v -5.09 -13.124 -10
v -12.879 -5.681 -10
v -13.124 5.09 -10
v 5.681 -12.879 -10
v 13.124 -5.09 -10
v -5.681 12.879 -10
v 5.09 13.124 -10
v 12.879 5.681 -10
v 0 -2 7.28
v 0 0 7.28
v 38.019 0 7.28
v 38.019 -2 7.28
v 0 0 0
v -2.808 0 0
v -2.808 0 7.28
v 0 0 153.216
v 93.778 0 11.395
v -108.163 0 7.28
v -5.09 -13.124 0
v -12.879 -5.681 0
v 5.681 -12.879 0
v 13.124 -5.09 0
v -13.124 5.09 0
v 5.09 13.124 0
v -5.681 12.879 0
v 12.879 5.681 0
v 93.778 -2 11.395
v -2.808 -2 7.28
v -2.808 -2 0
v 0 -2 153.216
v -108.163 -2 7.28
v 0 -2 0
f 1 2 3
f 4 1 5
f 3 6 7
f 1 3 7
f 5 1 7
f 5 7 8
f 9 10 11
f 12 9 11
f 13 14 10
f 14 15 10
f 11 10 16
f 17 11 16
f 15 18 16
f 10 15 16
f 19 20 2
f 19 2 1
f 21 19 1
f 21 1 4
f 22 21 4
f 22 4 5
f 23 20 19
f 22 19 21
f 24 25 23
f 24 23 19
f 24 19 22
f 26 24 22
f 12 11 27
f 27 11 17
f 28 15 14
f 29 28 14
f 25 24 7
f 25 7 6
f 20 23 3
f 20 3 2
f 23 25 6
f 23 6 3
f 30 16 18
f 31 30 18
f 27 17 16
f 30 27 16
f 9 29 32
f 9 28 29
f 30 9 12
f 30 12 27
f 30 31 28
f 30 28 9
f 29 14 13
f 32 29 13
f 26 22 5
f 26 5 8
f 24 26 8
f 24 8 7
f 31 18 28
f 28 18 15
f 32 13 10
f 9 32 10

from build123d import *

# Parameters (mm, degrees)
F1_DEPTH = 10
F3_DEPTH = 2


with BuildPart() as f1:
    # F0 (on Top) → F1 (new body)
    with BuildSketch(Plane.XY):
        Polygon((-5.680988, 12.879334), (-13.124129, 5.089999), (-12.879334, -5.680988), (-5.089999, -13.124129), (5.680988, -12.879334), (13.124129, -5.089999), (12.879334, 5.680988), (5.089999, 13.124129), align=None)
    extrude(amount=-F1_DEPTH)


with BuildPart() as f3:
    # F2 (on Front) → F3 (new body)
    with BuildSketch(Plane.XZ):
        Polygon((-2.808472, 0), (0, 0), (0, 7.280002), (0, 14.560004), (20.74383, 14.560004), (0, 42.571541), (0, 55.319596), (-31.359844, 14.560004), (-5.616945, 14.560004), (-2.808472, 7.280002), align=None)
        Polygon((0, 14.560004), (0, 7.280002), (38.019471, 7.280002), (0, 62.504523), (0, 90.102866), (-49.321156, 7.280002), (-2.808472, 7.280002), (-5.616945, 14.560004), (-31.359844, 14.560004), (0, 55.319596), (0, 42.571541), (20.74383, 14.560004), align=None)
        Polygon((0, 62.504523), (38.019471, 7.280002), (93.778126, 11.394593), (0, 153.215766), (-108.16288, 7.280002), (-49.321156, 7.280002), (0, 90.102866), align=None)
    extrude(amount=F3_DEPTH)


solid = Compound([f1.part, f3.part])
